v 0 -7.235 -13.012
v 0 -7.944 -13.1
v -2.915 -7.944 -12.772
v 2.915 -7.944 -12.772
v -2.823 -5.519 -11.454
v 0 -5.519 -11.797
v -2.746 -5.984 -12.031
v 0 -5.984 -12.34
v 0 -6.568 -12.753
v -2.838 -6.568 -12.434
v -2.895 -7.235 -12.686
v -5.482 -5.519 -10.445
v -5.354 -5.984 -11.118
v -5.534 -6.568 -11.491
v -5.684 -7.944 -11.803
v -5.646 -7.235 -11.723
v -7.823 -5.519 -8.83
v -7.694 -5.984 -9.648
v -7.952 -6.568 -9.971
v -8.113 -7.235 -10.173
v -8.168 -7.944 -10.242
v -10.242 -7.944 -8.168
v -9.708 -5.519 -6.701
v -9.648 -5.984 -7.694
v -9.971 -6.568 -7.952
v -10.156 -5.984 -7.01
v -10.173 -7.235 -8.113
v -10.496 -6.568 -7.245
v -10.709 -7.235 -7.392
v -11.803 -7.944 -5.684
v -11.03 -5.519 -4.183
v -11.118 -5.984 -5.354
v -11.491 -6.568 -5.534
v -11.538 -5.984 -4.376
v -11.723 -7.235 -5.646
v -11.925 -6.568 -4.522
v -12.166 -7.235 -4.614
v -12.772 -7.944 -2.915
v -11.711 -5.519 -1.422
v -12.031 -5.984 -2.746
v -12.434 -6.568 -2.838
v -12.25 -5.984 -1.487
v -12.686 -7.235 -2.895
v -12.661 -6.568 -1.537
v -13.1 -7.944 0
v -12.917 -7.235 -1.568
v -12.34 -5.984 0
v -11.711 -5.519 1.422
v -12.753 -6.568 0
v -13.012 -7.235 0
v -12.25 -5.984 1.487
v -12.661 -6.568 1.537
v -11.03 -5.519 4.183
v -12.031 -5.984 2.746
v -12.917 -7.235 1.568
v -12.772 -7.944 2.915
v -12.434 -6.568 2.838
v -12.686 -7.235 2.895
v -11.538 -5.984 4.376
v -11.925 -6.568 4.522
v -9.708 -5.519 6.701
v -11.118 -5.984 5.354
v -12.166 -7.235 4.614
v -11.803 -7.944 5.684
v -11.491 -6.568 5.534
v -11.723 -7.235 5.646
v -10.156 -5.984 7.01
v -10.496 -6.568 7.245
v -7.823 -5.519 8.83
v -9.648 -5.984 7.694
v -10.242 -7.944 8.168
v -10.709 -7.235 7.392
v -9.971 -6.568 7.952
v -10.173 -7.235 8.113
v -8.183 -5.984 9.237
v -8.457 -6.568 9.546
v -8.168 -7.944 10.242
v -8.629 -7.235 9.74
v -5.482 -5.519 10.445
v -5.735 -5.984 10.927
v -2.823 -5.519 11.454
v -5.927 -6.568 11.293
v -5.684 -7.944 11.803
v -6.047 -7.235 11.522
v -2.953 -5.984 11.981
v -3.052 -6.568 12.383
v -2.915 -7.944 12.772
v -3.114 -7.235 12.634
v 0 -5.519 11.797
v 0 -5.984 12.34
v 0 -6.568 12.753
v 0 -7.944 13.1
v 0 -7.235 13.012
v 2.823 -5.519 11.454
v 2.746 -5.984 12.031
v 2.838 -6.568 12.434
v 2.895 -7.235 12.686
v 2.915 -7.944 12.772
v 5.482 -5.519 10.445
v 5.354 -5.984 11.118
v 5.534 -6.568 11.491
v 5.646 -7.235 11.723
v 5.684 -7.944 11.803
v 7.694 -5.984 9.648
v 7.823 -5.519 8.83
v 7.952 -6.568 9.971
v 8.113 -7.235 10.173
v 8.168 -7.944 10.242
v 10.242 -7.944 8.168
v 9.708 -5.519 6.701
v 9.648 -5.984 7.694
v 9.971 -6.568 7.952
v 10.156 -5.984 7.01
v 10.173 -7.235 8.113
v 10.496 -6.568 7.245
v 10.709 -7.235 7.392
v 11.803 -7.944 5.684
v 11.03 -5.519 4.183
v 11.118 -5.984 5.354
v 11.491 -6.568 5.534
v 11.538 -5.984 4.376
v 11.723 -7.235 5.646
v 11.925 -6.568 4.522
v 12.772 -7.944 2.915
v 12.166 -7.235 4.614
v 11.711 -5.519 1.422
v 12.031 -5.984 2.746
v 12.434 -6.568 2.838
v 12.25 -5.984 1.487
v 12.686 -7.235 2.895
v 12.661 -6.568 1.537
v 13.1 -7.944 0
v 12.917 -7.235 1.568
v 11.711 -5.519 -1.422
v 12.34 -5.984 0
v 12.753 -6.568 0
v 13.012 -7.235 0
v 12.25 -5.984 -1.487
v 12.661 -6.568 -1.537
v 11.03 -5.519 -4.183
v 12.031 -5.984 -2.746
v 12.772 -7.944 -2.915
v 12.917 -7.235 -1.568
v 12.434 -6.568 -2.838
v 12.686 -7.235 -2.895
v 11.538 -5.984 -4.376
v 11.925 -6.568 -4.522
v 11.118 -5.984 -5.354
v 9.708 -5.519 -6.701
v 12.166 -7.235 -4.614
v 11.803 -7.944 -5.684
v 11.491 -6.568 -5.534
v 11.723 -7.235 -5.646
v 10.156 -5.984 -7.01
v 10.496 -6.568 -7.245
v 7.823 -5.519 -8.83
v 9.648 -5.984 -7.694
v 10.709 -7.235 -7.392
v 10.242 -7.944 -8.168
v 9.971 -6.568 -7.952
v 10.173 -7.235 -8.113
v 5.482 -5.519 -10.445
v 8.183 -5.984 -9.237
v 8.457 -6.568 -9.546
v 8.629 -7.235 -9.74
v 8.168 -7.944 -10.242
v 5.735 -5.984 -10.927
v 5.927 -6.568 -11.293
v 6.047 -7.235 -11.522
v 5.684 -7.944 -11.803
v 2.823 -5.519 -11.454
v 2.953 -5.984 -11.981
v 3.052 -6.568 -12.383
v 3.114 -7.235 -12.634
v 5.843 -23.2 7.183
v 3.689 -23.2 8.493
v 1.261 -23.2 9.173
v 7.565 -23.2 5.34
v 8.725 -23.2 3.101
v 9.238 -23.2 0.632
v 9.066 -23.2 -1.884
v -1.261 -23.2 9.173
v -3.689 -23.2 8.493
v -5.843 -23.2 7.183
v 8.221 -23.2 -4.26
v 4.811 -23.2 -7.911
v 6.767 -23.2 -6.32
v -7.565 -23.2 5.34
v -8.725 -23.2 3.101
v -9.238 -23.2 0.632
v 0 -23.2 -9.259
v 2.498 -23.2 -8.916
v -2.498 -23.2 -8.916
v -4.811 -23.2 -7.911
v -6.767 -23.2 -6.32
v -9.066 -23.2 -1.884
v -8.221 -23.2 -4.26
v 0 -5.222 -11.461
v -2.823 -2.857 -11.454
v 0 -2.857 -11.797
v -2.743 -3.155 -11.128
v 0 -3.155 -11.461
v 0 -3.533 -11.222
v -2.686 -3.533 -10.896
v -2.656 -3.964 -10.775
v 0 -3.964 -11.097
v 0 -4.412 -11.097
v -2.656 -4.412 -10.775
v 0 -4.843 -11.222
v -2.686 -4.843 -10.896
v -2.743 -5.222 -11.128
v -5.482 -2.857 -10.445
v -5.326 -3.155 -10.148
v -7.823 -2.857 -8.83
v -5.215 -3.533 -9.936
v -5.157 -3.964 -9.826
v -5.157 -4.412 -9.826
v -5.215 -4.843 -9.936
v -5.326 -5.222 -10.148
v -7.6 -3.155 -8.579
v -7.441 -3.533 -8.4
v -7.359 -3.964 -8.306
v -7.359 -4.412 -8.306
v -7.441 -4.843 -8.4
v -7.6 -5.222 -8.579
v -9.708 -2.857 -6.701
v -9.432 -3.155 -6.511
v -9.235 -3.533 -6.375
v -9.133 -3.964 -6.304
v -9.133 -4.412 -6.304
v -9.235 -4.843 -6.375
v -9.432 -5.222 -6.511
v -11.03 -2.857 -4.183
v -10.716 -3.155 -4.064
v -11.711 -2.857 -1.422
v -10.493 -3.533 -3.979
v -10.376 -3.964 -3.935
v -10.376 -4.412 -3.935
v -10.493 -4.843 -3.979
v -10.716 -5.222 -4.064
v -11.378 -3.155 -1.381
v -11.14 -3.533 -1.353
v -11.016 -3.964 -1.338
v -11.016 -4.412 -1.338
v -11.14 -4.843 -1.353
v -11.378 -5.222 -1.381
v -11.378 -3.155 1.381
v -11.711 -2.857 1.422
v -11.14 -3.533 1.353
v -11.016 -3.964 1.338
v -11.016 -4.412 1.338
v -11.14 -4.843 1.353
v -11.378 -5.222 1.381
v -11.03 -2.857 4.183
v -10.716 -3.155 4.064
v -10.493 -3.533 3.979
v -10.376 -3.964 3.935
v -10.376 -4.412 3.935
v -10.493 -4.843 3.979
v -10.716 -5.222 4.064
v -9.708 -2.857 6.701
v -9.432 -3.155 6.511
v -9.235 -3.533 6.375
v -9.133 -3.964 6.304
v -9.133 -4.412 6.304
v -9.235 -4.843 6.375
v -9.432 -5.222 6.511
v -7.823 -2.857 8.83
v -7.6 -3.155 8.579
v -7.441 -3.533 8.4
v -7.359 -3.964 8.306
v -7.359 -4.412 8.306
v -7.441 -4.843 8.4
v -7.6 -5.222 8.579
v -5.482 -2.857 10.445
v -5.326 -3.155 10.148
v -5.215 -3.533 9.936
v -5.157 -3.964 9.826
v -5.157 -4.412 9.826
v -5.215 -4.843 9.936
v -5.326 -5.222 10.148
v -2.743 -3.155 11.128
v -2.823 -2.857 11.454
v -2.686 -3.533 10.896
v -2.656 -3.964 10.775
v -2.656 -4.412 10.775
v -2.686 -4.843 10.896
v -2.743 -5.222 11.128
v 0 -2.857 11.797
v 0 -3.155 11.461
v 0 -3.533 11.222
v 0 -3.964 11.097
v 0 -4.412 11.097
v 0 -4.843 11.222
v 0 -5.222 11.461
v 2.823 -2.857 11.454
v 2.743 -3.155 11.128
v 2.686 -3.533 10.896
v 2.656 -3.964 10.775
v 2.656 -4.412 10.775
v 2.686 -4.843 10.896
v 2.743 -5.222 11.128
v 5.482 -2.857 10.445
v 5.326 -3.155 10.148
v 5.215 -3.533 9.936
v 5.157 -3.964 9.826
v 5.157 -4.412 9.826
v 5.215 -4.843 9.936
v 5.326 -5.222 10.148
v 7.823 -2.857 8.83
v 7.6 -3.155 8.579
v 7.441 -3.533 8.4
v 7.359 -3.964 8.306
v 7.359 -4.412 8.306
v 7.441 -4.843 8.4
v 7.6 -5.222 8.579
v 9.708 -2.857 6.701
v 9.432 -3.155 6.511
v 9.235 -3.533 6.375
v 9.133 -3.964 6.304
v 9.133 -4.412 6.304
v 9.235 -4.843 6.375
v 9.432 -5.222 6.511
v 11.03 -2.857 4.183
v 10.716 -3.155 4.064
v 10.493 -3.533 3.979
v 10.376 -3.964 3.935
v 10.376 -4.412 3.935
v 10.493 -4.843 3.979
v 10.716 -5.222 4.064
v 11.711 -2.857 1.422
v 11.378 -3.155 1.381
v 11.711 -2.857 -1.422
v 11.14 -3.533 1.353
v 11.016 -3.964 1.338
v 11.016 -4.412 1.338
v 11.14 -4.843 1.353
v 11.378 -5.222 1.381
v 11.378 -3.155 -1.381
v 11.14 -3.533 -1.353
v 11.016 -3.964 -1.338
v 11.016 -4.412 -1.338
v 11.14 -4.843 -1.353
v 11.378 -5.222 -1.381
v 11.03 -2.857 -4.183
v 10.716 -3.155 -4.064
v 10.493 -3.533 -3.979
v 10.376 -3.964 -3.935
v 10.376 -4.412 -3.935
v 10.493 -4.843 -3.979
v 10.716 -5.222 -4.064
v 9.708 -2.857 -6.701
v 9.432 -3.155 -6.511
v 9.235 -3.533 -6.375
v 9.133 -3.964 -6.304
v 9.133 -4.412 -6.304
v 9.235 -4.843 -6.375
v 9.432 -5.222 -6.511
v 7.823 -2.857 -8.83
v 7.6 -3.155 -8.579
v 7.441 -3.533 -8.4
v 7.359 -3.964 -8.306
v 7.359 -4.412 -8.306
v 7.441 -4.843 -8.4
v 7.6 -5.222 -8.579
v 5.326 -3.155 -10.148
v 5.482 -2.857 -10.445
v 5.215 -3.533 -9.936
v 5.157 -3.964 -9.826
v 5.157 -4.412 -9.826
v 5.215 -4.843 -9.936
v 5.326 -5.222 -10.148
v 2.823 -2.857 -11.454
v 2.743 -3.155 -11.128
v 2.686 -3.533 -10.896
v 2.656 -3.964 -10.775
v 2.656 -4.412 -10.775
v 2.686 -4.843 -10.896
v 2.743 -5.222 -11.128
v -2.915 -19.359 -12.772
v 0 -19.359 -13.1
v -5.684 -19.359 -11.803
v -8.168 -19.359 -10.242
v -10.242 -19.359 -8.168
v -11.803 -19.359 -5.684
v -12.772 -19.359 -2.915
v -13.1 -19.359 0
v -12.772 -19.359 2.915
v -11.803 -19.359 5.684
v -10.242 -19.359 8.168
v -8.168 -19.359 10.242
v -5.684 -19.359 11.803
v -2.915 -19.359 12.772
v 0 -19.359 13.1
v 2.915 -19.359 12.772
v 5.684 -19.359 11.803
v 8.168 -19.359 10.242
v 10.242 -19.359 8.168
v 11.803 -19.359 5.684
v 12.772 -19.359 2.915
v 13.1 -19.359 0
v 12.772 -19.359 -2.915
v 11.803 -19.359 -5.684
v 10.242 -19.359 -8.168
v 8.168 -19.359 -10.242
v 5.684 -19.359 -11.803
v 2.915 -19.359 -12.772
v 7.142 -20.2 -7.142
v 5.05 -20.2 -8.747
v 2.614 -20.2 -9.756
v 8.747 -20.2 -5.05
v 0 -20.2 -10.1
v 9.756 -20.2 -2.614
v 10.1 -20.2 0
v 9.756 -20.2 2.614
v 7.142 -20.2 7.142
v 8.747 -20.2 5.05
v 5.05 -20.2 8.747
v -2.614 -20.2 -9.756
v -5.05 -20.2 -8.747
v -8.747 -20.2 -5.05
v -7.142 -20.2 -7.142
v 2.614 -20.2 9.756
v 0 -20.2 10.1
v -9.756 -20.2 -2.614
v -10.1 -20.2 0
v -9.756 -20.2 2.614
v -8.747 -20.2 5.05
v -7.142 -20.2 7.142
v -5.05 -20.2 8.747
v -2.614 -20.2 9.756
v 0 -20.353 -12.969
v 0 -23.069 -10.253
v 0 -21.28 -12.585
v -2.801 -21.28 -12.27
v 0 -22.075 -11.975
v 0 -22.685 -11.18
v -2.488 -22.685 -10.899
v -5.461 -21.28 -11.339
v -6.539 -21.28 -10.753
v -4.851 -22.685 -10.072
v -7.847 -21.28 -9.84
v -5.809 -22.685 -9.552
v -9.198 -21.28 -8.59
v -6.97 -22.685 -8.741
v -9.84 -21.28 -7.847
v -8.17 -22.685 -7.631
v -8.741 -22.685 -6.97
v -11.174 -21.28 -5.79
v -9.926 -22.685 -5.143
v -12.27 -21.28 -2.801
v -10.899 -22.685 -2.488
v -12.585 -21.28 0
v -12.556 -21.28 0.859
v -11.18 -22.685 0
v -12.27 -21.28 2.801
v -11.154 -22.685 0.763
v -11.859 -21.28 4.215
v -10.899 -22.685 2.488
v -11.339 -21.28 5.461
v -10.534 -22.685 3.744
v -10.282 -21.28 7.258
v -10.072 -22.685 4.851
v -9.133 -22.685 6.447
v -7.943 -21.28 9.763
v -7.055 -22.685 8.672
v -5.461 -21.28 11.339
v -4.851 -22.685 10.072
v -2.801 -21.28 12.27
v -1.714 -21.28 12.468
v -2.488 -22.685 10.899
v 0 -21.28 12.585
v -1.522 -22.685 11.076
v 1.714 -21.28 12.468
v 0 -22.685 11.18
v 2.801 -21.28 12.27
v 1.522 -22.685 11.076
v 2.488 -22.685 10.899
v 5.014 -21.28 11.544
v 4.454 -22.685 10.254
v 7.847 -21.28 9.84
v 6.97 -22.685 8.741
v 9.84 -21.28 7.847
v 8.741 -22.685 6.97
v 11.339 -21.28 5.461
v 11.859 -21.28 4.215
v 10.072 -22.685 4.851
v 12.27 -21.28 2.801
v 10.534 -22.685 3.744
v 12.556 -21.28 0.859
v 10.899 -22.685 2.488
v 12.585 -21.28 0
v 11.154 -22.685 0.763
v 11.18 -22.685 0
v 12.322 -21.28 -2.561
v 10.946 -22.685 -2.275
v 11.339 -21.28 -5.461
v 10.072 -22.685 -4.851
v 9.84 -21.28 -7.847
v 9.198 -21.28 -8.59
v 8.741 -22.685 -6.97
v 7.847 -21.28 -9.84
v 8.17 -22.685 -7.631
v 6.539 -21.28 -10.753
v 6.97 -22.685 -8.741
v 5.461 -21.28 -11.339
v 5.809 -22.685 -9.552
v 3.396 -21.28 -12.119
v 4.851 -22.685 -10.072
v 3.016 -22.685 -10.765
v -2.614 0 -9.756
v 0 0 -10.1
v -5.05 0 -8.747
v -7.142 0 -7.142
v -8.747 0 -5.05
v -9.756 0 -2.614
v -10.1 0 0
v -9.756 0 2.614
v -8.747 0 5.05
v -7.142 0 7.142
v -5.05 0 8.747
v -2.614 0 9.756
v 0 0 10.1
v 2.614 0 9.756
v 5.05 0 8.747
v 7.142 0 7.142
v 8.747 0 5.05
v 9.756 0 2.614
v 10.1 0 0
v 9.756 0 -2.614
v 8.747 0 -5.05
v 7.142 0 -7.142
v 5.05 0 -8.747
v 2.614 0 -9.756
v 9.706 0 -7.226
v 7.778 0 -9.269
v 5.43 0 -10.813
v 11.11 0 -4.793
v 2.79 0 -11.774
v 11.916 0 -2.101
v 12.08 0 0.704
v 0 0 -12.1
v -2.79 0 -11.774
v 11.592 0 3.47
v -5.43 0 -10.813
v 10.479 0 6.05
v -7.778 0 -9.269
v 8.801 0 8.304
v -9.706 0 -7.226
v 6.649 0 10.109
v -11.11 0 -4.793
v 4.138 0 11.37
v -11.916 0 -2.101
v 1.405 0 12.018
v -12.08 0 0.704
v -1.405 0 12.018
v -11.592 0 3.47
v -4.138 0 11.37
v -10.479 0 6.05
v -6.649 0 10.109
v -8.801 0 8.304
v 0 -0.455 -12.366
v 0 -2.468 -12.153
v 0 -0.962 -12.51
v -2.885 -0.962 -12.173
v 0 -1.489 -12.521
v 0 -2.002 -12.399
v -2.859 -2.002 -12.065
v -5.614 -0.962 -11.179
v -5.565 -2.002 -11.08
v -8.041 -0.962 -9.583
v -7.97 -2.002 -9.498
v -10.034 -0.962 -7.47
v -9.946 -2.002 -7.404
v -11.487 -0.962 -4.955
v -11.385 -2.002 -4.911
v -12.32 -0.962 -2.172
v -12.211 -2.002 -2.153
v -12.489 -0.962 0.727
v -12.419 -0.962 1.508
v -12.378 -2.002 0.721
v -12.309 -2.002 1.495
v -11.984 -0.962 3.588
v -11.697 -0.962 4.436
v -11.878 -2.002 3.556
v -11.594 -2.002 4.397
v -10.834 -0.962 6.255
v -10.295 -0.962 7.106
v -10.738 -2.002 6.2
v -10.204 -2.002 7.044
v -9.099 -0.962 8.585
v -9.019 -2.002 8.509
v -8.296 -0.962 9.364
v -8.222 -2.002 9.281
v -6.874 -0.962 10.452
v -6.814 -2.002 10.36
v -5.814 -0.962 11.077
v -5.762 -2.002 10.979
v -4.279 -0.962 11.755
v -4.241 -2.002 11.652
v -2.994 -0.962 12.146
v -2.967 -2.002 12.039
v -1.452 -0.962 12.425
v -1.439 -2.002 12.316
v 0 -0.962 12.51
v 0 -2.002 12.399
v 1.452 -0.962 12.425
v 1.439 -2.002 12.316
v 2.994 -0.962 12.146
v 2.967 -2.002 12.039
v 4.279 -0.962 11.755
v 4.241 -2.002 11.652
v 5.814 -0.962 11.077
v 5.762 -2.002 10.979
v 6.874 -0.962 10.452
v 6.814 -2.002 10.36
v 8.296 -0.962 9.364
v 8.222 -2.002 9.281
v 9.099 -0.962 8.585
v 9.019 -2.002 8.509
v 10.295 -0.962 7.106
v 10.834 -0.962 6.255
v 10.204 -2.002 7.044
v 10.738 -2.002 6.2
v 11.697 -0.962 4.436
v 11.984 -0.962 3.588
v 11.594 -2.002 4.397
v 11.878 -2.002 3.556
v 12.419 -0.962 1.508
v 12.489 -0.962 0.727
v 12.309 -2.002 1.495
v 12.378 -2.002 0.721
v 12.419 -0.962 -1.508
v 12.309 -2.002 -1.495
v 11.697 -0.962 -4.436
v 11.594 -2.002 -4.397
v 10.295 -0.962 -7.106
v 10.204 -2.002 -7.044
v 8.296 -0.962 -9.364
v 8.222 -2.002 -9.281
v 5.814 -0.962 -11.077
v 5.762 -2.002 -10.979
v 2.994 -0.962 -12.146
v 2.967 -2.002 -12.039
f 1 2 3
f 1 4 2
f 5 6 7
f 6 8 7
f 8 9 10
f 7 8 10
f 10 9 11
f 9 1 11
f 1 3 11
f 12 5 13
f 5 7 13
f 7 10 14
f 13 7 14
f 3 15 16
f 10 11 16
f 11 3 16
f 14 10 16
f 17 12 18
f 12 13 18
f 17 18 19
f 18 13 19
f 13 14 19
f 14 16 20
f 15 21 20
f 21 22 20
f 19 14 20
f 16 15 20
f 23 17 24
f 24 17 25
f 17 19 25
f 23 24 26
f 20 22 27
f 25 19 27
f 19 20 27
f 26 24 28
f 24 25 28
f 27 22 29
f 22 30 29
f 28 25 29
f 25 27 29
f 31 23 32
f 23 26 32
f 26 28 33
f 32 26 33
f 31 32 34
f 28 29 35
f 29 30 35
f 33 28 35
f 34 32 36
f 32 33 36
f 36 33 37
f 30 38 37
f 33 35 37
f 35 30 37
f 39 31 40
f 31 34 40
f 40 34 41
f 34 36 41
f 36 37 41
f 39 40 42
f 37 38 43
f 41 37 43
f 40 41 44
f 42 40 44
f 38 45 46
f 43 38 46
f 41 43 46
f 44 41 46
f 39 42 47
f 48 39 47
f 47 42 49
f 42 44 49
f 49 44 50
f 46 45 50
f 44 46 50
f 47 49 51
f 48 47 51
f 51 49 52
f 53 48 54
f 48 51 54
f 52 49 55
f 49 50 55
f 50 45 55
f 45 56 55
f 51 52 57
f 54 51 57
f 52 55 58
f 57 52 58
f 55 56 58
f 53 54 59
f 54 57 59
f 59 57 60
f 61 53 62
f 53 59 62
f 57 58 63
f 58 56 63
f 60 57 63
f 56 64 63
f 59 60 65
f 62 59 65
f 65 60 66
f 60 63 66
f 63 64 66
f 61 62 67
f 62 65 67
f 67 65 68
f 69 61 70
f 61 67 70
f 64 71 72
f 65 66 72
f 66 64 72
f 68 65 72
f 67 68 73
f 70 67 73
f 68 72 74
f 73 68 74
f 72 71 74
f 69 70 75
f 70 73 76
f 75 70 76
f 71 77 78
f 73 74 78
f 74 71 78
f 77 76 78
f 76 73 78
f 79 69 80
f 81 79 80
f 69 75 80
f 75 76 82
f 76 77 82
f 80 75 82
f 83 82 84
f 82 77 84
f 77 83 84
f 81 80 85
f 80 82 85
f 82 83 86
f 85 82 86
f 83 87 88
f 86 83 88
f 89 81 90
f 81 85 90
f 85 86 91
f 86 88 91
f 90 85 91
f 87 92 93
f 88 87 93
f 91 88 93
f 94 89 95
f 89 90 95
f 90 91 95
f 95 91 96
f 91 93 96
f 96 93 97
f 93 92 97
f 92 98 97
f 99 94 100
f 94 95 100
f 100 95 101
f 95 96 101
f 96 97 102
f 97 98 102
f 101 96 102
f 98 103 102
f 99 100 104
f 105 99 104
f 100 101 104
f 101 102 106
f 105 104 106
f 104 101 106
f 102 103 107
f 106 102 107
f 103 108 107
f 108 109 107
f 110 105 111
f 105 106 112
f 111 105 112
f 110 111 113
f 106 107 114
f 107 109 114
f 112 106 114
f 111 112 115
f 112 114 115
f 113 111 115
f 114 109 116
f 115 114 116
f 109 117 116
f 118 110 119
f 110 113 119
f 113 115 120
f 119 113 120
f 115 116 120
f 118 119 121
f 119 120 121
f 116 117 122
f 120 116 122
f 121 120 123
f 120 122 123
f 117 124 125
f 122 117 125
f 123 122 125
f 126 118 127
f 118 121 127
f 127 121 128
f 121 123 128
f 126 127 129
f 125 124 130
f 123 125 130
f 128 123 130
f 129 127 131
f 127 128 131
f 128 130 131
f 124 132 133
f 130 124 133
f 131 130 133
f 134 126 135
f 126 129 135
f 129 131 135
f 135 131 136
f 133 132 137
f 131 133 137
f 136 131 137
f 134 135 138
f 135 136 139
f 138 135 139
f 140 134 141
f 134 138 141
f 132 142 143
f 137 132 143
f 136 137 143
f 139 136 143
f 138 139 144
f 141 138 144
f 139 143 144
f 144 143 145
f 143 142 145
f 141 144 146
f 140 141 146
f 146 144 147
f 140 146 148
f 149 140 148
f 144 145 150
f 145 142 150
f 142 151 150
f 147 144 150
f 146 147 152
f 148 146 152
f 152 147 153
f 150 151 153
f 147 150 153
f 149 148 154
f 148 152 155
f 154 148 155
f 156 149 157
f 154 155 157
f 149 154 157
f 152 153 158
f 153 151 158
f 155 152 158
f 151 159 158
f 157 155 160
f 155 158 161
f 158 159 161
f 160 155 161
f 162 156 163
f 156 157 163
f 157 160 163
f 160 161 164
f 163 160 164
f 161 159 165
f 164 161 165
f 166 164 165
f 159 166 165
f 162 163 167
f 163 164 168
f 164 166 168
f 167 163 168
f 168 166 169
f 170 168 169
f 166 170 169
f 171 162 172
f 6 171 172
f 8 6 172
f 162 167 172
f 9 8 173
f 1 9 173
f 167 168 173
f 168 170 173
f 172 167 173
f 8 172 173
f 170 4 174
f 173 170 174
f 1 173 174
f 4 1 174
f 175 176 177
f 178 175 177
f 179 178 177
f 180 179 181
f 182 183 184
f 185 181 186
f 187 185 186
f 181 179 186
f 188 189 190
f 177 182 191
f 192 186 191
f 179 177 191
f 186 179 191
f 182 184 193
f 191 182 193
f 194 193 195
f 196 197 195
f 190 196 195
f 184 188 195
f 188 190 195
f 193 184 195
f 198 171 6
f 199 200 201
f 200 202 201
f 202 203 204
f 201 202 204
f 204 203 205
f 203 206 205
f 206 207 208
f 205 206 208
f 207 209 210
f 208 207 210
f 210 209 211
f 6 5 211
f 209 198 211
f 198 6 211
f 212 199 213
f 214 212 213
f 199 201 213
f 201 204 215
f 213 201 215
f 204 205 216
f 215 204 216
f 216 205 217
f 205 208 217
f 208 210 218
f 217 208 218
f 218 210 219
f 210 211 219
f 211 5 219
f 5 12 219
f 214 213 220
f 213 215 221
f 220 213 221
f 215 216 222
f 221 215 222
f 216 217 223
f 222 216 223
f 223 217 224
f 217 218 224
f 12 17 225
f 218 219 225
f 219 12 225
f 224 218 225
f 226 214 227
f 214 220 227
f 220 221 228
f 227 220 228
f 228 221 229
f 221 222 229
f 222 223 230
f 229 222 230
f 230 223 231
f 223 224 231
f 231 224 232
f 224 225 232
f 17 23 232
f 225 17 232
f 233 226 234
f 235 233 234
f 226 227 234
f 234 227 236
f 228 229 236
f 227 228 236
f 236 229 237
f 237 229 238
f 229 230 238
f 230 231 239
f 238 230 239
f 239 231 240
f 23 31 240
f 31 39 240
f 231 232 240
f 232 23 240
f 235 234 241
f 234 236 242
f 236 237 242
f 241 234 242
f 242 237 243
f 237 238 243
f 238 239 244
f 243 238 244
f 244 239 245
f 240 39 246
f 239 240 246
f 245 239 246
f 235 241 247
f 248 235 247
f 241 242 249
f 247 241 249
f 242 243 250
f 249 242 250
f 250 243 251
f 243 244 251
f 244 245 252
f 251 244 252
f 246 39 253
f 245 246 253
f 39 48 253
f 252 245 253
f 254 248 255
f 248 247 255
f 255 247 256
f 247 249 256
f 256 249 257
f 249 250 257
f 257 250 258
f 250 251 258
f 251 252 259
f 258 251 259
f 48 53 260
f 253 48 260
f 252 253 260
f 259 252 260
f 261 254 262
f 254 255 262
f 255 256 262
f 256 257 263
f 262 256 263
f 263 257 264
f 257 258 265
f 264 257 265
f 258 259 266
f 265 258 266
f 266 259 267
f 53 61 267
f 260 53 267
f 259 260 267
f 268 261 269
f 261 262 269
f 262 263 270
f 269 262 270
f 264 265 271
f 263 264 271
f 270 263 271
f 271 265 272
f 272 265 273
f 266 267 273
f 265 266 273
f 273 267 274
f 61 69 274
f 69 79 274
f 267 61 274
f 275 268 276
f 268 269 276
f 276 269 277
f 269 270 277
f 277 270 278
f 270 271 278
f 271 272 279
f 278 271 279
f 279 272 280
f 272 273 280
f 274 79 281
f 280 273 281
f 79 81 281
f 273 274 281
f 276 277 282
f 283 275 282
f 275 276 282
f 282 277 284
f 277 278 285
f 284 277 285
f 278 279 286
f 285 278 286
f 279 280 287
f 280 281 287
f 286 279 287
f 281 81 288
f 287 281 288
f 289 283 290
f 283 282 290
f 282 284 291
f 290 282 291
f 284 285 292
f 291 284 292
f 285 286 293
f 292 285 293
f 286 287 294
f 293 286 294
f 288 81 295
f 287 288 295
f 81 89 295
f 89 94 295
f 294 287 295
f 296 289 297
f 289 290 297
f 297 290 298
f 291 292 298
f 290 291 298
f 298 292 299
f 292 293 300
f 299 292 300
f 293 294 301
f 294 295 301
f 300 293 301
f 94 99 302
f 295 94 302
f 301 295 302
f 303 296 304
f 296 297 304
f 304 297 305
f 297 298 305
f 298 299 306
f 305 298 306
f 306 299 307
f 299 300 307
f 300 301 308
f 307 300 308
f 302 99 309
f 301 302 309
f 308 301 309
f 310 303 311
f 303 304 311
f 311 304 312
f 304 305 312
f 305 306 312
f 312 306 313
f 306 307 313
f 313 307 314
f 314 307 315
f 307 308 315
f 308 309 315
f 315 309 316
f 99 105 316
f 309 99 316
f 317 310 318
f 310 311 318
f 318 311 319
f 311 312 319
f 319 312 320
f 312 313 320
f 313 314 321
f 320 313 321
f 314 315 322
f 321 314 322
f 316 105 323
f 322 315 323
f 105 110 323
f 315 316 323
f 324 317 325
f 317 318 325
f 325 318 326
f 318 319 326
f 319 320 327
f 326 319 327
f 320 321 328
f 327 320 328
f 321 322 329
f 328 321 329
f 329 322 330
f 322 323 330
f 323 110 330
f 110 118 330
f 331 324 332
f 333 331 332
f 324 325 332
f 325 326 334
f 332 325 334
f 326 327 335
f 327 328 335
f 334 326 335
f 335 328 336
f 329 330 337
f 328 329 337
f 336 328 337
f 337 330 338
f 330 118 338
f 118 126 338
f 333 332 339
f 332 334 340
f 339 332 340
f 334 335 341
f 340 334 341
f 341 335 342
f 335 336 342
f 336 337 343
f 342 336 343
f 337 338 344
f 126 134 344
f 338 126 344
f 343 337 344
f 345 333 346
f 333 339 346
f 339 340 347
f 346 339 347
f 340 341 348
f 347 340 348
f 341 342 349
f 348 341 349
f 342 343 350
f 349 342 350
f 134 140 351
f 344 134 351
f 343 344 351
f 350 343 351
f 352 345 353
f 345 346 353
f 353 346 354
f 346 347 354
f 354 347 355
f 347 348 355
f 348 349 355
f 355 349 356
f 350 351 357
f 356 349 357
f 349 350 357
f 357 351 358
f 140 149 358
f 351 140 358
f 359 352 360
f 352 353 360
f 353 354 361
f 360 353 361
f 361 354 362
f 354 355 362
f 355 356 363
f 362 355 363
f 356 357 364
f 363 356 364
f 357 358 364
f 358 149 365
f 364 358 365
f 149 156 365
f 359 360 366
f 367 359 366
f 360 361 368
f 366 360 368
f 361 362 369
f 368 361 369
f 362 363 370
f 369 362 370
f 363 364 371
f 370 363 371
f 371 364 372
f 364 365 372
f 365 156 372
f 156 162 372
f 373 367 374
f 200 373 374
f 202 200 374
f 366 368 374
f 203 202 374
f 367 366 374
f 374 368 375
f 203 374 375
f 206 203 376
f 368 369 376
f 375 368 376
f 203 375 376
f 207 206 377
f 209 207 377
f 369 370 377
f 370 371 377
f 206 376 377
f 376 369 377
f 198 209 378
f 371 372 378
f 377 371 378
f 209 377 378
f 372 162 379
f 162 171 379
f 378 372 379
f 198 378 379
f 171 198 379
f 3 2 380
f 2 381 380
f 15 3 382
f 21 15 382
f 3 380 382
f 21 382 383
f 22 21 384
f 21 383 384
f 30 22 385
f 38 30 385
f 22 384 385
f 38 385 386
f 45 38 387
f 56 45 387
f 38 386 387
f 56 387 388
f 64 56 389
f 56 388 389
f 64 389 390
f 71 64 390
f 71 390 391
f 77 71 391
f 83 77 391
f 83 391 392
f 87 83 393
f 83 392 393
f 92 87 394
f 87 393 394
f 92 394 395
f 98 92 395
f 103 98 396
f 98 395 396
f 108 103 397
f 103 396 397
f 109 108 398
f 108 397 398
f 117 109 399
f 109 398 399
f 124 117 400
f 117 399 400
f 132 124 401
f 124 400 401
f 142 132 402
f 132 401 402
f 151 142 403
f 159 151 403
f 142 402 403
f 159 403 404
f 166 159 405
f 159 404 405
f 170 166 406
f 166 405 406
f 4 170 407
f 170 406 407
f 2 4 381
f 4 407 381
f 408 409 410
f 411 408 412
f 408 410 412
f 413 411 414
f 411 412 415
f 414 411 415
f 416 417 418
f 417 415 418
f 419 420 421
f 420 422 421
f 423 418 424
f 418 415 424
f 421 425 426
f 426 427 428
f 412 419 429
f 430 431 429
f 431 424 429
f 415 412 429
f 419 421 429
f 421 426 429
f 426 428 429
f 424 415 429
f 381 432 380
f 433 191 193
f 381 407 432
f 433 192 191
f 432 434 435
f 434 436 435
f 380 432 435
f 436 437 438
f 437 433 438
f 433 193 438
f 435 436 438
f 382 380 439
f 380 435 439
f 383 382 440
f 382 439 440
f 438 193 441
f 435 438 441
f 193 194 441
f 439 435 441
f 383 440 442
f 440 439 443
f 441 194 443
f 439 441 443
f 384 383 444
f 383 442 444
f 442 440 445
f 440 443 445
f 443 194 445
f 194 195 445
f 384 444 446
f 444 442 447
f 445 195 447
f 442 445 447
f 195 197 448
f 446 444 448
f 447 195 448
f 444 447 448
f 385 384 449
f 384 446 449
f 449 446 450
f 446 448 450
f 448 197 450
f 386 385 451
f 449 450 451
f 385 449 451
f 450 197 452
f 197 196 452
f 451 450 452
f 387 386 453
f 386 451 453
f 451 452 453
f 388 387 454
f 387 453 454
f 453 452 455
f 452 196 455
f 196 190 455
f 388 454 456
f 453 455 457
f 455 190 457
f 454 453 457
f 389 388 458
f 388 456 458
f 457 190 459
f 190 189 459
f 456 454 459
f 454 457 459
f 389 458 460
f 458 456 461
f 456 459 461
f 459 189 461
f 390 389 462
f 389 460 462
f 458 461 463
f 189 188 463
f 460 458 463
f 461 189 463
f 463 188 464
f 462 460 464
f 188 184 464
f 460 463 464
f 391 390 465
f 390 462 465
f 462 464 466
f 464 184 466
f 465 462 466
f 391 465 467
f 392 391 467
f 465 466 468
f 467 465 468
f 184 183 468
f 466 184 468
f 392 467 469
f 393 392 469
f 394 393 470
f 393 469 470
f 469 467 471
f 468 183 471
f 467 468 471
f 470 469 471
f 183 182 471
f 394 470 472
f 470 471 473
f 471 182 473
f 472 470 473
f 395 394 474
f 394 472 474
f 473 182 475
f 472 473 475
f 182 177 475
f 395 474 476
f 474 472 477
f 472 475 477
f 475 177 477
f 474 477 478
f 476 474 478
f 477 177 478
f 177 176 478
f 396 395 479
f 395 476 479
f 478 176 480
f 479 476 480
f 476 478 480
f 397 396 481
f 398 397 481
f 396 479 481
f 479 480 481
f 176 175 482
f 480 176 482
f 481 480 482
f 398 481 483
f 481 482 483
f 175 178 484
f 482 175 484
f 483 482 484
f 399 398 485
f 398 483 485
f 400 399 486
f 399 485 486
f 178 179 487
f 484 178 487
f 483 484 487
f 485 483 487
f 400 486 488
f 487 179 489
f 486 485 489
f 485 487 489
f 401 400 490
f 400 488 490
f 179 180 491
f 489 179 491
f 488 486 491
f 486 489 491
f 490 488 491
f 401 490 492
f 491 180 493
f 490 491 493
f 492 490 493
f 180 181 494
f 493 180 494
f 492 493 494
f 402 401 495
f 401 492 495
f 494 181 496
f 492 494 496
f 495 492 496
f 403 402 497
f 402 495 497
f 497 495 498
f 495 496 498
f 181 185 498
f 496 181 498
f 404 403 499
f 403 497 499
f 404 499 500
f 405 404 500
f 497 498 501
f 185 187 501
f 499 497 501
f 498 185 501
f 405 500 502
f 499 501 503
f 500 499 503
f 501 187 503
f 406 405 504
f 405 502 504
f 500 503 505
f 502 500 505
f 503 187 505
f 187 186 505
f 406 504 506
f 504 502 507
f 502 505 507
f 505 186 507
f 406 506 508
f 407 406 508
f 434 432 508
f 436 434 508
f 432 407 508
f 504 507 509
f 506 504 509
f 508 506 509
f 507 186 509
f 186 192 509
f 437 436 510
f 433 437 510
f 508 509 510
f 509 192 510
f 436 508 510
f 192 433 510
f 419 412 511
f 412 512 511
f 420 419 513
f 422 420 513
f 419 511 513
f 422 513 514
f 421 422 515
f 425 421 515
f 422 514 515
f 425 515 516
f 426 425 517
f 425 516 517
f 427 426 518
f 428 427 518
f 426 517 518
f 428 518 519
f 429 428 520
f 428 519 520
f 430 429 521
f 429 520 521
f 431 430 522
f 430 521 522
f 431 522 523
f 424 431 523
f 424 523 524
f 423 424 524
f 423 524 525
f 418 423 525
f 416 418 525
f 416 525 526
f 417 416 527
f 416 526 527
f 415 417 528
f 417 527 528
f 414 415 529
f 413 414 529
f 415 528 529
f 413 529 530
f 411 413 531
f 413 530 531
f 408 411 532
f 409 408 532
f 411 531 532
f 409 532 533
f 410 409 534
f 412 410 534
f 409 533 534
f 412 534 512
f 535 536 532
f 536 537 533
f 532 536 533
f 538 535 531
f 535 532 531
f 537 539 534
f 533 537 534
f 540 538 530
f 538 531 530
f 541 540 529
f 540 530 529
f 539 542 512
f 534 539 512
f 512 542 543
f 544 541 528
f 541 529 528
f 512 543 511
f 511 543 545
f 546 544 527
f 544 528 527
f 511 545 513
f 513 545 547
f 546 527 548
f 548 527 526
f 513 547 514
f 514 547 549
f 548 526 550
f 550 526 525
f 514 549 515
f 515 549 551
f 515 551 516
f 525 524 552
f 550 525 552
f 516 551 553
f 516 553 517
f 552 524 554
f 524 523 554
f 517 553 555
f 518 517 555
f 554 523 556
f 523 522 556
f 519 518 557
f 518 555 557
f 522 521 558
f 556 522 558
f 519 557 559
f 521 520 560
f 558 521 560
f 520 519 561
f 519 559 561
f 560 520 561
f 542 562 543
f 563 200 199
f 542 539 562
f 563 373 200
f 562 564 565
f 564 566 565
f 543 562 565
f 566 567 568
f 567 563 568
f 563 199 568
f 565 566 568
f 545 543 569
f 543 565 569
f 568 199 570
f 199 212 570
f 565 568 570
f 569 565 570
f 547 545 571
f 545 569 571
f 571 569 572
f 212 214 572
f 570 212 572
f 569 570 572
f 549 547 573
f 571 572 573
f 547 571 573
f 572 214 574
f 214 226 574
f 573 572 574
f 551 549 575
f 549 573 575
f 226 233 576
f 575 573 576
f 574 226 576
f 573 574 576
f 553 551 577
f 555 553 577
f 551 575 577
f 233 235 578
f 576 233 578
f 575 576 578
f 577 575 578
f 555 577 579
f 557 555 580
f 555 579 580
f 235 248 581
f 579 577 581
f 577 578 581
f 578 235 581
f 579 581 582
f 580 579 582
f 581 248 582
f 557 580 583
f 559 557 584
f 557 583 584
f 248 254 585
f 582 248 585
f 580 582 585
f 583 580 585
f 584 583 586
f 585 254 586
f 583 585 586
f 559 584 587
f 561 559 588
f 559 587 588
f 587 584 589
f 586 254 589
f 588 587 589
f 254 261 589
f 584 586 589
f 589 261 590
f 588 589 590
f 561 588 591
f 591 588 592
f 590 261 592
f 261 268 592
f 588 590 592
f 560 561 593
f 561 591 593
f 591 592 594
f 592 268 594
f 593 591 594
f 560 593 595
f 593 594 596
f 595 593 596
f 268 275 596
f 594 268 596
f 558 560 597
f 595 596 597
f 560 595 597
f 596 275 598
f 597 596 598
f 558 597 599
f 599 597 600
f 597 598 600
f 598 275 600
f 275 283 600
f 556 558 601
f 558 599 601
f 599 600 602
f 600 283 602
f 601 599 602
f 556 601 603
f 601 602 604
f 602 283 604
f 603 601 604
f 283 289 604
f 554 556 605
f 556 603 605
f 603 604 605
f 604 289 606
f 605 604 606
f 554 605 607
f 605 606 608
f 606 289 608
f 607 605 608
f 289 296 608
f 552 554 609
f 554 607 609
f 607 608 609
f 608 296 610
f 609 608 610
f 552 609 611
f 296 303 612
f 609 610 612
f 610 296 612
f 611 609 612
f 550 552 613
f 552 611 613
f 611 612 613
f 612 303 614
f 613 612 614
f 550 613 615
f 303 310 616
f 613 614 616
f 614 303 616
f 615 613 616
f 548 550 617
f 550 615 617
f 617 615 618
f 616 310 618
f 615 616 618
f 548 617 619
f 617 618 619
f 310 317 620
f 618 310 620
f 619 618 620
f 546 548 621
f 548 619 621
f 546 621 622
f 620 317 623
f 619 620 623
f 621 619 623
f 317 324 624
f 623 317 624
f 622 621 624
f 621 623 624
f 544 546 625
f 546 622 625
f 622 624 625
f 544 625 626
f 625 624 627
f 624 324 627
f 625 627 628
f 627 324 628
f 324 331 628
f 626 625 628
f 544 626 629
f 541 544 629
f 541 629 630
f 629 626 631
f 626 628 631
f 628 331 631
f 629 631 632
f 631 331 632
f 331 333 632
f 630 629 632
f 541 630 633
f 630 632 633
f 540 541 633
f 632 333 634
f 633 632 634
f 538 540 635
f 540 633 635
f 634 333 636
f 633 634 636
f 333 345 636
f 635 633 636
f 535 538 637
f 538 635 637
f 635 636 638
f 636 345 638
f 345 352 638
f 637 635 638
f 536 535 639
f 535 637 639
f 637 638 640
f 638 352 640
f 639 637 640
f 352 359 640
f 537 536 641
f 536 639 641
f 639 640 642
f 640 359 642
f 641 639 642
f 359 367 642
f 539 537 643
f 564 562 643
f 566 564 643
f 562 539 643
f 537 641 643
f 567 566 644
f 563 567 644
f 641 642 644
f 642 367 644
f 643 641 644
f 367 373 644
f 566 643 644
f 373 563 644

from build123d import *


with BuildPart() as part:
    # 스케치2 → 회전1 (revolve)
    with BuildSketch(Plane(origin=(0, 0, 0), x_dir=(0, 0, -1), z_dir=(1, 0, 0))):
        with BuildLine():
            Line((10.1, 0), (12.1, 0))
            ThreePointArc((12.1, 0), (12.521081242, -1.48943877), (11.796548935, -2.857207098))
            ThreePointArc((11.796548935, -2.857207098), (11.081359136, -4.188050052), (11.796542721, -5.518896345))
            ThreePointArc((11.796542721, -5.518896345), (12.753495116, -6.567634704), (13.1, -7.944422413))
            Line((13.1, -7.944422413), (13.1, -19.359260843))
            ThreePointArc((13.1, -19.359260843), (11.975073546, -22.075073546), (9.259260843, -23.2))
            Line((9.259260843, -23.2), (0, -23.2))
            Line((0, -23.2), (0, -20.2))
            Line((0, -20.2), (10.1, -20.2))
            Line((10.1, -20.2), (10.1, 0))
        make_face()
    revolve(axis=Axis((0, -20.2, 0), (0, 1, 0)))


solid = part.part
